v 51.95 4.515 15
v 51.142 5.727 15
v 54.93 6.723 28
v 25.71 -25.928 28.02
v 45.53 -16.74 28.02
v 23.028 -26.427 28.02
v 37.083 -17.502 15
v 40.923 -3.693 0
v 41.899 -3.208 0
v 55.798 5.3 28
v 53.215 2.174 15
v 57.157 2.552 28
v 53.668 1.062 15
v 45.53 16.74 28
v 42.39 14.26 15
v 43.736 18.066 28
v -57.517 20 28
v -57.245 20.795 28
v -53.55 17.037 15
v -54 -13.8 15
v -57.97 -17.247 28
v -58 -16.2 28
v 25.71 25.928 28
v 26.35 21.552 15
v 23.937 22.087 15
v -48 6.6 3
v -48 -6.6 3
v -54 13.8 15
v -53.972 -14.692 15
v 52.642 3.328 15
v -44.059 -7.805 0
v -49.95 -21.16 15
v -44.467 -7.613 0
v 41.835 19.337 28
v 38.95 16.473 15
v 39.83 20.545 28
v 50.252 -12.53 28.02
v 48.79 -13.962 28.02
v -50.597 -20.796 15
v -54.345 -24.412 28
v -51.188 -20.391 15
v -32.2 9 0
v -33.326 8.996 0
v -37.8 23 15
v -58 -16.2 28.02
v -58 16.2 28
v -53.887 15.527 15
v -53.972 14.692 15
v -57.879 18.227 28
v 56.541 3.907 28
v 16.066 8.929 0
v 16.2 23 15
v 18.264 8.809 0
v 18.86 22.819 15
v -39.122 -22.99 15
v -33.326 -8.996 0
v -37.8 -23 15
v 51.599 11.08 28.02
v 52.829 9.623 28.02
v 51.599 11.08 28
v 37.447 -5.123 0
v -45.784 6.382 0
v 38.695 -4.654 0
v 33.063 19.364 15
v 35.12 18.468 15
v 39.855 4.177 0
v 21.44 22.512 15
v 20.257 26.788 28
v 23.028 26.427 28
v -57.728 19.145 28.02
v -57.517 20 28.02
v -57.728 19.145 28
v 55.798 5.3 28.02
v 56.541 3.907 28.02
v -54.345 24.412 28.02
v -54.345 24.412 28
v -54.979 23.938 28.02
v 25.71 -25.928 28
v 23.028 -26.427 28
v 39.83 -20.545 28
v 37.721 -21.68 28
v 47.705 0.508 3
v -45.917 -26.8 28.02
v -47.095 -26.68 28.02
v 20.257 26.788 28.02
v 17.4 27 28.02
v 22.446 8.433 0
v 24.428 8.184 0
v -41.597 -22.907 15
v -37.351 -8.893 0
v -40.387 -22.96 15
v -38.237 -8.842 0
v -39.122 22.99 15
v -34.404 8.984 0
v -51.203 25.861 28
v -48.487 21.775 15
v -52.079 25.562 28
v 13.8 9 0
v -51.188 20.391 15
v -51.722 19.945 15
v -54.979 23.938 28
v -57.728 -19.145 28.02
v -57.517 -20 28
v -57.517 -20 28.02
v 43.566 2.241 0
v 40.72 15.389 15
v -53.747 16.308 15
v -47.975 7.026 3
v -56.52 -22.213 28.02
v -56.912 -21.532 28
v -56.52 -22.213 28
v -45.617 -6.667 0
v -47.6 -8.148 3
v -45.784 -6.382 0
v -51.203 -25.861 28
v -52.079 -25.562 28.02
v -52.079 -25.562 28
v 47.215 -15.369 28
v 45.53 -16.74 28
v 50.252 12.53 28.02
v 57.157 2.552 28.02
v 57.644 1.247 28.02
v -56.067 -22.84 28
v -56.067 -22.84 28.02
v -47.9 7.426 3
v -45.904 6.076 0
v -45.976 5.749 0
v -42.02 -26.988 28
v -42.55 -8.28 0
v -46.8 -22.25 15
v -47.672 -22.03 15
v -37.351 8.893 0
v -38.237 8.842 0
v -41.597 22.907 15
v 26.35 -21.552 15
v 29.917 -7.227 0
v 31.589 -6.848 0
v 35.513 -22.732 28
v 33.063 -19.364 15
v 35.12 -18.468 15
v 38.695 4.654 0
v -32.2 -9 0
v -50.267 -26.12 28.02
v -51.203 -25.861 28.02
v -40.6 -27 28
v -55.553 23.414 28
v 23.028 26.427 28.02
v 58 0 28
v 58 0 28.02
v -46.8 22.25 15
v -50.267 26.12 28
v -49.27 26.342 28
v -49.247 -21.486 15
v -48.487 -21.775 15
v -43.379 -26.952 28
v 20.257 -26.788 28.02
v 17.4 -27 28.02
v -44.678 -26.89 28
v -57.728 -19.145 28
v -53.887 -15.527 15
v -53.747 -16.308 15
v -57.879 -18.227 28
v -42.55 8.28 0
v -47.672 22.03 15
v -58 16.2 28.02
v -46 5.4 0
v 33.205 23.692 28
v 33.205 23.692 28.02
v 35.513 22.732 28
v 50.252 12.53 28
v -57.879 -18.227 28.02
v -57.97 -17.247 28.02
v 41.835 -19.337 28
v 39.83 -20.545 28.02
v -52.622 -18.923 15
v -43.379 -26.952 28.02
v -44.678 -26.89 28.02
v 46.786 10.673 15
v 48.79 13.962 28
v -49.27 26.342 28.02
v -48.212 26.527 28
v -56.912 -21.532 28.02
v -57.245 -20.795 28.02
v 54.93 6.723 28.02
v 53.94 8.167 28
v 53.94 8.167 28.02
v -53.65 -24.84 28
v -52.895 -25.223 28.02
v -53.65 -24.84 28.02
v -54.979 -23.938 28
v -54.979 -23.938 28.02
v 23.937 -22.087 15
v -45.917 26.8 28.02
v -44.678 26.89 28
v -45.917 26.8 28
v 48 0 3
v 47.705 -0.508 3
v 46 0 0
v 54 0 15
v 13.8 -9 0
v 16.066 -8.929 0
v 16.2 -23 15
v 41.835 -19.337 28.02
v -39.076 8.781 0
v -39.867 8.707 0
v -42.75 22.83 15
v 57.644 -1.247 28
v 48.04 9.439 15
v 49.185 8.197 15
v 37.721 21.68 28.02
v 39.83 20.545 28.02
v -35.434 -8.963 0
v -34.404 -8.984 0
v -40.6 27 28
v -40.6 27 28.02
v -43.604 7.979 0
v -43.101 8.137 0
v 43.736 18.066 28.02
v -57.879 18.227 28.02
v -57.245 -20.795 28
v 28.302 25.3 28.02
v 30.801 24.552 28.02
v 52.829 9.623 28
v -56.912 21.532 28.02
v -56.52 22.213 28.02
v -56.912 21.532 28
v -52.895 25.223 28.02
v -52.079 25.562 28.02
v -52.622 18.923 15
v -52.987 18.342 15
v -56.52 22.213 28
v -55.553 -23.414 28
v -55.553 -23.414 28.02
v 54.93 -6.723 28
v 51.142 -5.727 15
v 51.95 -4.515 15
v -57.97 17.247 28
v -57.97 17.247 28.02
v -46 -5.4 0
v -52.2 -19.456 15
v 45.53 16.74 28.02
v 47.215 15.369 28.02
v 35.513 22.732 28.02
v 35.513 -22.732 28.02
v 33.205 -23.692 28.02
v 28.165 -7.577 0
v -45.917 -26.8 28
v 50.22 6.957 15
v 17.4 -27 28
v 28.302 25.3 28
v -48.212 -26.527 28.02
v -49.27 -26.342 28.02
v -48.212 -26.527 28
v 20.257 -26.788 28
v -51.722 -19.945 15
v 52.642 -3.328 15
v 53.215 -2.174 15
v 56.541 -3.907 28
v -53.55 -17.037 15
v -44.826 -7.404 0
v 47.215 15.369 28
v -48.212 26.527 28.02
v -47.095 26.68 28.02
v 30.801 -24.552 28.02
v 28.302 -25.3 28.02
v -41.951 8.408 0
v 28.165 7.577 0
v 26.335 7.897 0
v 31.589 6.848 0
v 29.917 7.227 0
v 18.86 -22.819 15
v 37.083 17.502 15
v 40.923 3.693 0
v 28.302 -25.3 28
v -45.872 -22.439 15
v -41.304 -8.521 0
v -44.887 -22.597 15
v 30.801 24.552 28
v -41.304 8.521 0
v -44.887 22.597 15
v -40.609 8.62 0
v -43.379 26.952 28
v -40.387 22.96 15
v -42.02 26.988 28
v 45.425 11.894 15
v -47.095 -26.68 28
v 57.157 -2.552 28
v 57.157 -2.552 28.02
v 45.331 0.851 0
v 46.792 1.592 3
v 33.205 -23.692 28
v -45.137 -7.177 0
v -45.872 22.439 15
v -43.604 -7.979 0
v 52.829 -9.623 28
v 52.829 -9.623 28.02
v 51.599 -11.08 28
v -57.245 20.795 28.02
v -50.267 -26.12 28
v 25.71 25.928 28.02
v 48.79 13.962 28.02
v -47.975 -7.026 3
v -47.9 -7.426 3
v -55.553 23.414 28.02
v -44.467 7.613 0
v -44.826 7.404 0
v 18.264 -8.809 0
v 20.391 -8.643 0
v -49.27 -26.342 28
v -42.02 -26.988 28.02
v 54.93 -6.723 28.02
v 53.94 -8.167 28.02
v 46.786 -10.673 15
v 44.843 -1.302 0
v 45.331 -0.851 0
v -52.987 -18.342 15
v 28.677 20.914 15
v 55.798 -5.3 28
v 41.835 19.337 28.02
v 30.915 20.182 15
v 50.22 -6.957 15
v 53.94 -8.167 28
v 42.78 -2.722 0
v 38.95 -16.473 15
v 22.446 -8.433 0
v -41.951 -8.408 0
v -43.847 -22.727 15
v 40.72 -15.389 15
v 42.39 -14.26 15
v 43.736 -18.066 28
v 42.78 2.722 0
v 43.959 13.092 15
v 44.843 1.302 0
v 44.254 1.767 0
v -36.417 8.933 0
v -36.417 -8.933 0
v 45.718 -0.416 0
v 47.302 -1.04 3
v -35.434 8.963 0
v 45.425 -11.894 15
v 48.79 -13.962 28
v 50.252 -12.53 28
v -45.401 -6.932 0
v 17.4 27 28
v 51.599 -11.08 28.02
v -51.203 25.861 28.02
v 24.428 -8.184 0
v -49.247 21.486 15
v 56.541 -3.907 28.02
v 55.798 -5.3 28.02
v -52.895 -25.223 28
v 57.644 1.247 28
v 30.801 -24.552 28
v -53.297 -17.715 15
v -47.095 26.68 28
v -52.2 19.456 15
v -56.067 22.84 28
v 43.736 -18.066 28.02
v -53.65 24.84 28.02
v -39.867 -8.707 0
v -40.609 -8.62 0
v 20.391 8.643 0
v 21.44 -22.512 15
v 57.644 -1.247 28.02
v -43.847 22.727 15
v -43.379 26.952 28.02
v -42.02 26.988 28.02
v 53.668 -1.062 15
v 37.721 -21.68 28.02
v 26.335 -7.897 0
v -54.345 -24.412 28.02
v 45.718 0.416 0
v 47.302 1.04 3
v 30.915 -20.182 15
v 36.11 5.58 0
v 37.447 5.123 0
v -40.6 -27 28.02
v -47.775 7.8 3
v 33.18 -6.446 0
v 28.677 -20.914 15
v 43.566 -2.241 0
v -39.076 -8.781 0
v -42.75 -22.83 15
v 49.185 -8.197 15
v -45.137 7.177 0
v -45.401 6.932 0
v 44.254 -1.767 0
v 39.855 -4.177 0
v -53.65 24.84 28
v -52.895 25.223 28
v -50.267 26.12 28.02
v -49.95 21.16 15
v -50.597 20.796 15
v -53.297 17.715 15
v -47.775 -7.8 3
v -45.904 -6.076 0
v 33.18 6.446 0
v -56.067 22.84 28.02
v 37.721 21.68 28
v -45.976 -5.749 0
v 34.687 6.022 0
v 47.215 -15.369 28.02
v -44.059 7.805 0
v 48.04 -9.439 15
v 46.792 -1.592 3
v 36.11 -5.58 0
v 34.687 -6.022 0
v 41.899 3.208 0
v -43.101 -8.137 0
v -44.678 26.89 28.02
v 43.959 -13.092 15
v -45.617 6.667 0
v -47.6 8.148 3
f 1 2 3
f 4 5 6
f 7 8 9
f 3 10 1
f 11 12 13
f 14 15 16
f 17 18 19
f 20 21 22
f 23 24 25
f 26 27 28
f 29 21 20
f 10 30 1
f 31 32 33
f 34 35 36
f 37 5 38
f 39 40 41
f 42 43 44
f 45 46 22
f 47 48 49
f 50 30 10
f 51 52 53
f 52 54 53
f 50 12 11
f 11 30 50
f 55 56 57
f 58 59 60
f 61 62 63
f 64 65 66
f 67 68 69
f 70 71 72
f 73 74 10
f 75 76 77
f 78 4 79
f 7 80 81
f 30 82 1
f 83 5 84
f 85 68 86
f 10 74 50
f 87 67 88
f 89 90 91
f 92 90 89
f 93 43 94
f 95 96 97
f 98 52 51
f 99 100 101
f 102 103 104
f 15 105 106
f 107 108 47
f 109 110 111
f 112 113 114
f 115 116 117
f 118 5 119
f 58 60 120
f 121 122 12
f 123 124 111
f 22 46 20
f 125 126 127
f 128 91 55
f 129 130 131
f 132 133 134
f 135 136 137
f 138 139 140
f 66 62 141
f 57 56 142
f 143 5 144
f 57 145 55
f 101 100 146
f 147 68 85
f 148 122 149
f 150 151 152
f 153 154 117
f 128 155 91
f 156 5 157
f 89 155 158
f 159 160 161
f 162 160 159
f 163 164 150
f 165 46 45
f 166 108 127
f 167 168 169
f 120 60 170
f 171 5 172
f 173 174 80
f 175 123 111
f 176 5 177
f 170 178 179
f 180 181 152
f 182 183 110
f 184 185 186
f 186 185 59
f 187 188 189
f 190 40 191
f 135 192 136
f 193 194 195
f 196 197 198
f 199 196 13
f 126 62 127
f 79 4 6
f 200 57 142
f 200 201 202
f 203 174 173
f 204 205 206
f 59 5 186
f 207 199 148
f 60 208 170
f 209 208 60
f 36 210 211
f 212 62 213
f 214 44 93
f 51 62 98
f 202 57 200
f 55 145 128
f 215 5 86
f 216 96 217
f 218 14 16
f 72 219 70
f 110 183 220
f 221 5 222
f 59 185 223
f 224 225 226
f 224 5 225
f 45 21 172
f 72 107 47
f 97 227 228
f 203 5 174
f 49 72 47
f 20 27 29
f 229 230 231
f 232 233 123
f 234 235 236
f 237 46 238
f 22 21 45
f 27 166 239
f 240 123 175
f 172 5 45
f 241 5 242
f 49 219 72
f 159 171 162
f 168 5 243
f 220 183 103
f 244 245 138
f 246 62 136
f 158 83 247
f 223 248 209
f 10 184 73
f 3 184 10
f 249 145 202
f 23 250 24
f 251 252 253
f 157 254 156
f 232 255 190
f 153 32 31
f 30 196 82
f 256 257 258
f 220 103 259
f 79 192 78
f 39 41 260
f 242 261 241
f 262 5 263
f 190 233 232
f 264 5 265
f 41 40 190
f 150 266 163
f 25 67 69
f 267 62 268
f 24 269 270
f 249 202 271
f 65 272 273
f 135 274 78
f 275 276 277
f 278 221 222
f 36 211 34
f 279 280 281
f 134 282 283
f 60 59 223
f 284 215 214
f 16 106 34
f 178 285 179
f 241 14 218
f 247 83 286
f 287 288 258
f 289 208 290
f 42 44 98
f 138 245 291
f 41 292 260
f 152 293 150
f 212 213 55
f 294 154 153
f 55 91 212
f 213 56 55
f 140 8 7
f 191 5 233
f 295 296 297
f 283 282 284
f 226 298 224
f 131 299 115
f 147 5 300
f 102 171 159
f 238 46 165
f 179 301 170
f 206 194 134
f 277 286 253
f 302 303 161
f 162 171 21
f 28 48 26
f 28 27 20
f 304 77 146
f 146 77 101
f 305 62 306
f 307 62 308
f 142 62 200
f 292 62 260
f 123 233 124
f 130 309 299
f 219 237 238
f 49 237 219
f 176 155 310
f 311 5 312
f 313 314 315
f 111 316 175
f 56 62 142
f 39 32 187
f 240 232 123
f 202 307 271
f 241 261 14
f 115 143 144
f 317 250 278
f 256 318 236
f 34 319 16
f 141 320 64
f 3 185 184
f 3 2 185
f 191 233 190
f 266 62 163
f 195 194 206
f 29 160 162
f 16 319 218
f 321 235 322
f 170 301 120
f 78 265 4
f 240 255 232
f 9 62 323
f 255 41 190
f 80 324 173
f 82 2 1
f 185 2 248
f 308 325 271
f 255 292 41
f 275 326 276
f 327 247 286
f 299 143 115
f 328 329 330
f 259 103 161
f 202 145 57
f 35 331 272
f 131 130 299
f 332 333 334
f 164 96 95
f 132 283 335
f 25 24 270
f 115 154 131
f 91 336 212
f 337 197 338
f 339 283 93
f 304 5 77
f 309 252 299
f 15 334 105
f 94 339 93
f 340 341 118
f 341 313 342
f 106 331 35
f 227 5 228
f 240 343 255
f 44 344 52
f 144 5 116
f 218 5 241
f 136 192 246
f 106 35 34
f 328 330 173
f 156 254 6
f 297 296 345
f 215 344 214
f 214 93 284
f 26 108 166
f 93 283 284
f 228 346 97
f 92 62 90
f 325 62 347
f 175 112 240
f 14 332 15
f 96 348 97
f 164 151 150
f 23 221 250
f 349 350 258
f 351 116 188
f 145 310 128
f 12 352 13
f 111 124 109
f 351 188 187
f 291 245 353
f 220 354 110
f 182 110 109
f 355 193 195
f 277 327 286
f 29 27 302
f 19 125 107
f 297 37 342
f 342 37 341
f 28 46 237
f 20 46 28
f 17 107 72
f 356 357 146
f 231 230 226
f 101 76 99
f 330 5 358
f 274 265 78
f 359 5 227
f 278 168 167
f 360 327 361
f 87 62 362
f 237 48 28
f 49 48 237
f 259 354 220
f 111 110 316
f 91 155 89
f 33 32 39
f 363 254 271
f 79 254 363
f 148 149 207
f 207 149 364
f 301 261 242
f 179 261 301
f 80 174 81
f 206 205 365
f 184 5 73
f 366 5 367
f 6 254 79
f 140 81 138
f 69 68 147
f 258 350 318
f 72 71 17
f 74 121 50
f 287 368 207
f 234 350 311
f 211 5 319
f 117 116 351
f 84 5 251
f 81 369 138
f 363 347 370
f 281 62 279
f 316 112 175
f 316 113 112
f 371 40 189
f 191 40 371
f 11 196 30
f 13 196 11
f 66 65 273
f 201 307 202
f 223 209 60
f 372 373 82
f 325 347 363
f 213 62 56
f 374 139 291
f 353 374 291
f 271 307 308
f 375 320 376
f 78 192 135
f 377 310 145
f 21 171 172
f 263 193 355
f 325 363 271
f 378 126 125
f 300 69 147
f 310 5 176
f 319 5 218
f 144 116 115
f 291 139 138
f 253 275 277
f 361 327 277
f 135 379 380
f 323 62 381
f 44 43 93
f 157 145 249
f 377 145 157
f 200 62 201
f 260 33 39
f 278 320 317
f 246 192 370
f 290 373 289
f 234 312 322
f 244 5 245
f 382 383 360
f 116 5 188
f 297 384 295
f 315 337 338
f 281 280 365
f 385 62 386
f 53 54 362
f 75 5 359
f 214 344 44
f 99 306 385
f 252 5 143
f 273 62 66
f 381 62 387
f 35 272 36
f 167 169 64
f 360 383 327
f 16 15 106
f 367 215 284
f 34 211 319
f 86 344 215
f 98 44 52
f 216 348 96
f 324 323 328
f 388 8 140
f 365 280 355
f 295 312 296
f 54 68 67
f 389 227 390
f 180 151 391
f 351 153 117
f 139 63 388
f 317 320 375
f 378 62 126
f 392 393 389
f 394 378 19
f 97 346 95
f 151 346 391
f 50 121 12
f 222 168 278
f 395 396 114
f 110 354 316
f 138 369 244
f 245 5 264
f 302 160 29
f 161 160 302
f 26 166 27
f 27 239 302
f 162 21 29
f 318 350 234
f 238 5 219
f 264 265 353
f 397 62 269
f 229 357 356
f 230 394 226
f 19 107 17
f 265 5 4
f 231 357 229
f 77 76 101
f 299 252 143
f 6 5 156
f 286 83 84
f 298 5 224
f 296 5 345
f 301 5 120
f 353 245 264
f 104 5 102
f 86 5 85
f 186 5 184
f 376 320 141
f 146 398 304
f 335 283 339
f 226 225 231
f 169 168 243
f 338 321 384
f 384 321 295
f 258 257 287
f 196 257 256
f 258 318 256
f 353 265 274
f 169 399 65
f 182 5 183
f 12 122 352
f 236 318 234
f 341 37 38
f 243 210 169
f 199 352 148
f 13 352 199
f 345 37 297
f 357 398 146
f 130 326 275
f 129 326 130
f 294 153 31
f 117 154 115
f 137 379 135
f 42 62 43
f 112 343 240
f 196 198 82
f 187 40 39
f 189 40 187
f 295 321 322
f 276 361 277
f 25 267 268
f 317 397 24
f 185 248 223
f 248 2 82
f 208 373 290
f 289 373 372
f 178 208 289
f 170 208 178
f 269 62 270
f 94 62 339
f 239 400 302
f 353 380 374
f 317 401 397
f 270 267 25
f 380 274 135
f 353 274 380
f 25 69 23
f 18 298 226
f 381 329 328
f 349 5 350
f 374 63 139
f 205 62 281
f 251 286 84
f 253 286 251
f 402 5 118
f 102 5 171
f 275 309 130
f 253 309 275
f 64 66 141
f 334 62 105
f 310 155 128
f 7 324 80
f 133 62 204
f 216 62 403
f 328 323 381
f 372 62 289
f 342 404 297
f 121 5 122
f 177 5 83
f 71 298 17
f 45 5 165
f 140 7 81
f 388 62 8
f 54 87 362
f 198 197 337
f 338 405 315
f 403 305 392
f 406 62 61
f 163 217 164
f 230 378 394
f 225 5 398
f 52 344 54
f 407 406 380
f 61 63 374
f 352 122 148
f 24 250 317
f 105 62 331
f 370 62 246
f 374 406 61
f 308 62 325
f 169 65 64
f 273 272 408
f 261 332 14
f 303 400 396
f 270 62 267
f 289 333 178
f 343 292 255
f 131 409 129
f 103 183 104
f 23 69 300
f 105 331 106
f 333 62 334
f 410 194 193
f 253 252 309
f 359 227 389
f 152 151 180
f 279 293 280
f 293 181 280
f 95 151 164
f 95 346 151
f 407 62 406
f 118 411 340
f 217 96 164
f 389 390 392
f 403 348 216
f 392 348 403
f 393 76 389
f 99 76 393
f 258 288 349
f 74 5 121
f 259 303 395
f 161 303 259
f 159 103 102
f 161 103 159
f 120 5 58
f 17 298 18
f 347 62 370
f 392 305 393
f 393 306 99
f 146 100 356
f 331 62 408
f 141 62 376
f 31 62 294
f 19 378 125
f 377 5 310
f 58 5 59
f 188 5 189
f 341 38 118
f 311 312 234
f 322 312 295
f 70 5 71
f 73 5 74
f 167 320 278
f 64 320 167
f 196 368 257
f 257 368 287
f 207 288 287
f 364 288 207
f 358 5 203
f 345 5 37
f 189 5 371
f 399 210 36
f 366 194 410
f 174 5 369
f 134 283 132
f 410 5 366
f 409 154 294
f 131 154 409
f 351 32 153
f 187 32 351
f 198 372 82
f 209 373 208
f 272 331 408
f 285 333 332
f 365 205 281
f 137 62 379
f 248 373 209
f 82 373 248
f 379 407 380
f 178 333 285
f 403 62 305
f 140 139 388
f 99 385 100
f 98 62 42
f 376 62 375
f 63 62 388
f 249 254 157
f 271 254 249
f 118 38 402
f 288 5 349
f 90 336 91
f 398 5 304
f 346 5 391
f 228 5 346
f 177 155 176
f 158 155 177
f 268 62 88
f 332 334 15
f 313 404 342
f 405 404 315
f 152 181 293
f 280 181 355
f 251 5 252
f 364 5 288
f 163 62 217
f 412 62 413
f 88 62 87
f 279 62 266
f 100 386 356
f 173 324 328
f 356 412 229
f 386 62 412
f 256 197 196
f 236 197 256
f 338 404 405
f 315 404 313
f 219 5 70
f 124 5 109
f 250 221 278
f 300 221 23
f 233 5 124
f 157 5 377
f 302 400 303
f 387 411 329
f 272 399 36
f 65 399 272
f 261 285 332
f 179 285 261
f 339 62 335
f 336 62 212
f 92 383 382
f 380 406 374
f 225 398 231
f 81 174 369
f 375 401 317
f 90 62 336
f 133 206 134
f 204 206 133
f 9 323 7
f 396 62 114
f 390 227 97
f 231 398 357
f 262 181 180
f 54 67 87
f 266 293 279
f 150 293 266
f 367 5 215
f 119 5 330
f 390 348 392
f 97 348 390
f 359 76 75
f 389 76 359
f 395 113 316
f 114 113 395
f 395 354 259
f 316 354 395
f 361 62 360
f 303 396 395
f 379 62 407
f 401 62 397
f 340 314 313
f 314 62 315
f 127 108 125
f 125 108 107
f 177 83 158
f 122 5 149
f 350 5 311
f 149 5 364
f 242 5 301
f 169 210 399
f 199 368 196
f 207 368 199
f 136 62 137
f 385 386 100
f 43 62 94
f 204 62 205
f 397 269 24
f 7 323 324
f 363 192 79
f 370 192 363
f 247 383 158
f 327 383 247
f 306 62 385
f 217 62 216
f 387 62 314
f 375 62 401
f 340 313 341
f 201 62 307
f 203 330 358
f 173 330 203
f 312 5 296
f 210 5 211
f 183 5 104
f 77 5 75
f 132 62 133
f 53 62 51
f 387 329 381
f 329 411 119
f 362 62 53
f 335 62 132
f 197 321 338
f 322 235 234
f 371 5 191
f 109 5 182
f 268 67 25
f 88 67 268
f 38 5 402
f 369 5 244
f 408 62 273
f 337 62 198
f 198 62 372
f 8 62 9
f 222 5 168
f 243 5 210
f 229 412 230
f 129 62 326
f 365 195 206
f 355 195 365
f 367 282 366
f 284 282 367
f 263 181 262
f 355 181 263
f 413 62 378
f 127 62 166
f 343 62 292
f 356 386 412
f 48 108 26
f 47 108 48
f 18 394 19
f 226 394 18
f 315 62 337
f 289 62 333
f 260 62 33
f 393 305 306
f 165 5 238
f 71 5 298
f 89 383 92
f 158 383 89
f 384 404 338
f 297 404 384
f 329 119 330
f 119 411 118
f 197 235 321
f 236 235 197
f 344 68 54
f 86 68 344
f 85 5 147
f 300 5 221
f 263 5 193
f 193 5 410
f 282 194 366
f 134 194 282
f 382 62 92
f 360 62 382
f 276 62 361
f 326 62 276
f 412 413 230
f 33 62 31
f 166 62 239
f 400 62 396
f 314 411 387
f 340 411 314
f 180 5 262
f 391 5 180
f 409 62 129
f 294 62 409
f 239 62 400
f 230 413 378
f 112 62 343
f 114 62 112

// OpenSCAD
hull() {
  hull() {
    hull() {
      translate([0, 0, 0]) {
        linear_extrude(height = 2.0e-2) {
          polygon(points = [[-46, -5.4], [-45.976041667, -5.748854167], [-45.904166667, -6.075833333], [-45.784375, -6.3815625], [-45.616666667, -6.666666667], [-45.401041667, -6.931770833], [-45.1375, -7.1775], [-44.826041667, -7.404479167], [-44.466666667, -7.613333333], [-44.059375, -7.8046875], [-43.604166667, -7.979166667], [-43.101041667, -8.137395833], [-42.55, -8.28], [-41.951041667, -8.407604167], [-41.304166667, -8.520833333], [-40.609375, -8.6203125], [-39.866666667, -8.706666667], [-39.076041667, -8.780520833], [-38.2375, -8.8425], [-37.351041667, -8.893229167], [-36.416666667, -8.933333333], [-35.434375, -8.9634375], [-34.404166667, -8.984166667], [-33.326041667, -8.996145833], [-32.2, -9], [-30.451707176, -9], [-28.659490741, -9], [-26.82734375, -9], [-24.959259259, -9], [-23.059230324, -9], [-21.13125, -9], [-19.179311343, -9], [-17.207407407, -9], [-15.21953125, -9], [-13.219675926, -9], [-11.211834491, -9], [-9.2, -9], [-7.188165509, -9], [-5.180324074, -9], [-3.18046875, -9], [-1.192592593, -9], [0.779311343, -9], [2.73125, -9], [4.659230324, -9], [6.559259259, -9], [8.42734375, -9], [10.259490741, -9], [12.051707176, -9], [13.8, -9], [16.06619213, -8.929270833], [18.263703704, -8.809166667], [20.3909375, -8.6428125], [22.446296296, -8.433333333], [24.42818287, -8.183854167], [26.335, -7.8975], [28.165150463, -7.577395833], [29.917037037, -7.226666667], [31.5890625, -6.8484375], [33.17962963, -6.445833333], [34.687141204, -6.021979167], [36.11, -5.58], [37.446608796, -5.123020833], [38.69537037, -4.654166667], [39.8546875, -4.1765625], [40.922962963, -3.693333333], [41.898599537, -3.207604167], [42.78, -2.7225], [43.56556713, -2.241145833], [44.253703704, -1.766666667], [44.8428125, -1.3021875], [45.331296296, -0.850833333], [45.71755787, -0.415729167], [46, 0], [45.71755787, 0.415729167], [45.331296296, 0.850833333], [44.8428125, 1.3021875], [44.253703704, 1.766666667], [43.56556713, 2.241145833], [42.78, 2.7225], [41.898599537, 3.207604167], [40.922962963, 3.693333333], [39.8546875, 4.1765625], [38.69537037, 4.654166667], [37.446608796, 5.123020833], [36.11, 5.58], [34.687141204, 6.021979167], [33.17962963, 6.445833333], [31.5890625, 6.8484375], [29.917037037, 7.226666667], [28.165150463, 7.577395833], [26.335, 7.8975], [24.42818287, 8.183854167], [22.446296296, 8.433333333], [20.3909375, 8.6428125], [18.263703704, 8.809166667], [16.06619213, 8.929270833], [13.8, 9], [12.051707176, 9], [10.259490741, 9], [8.42734375, 9], [6.559259259, 9], [4.659230324, 9], [2.73125, 9], [0.779311343, 9], [-1.192592593, 9], [-3.18046875, 9], [-5.180324074, 9], [-7.188165509, 9], [-9.2, 9], [-11.211834491, 9], [-13.219675926, 9], [-15.21953125, 9], [-17.207407407, 9], [-19.179311343, 9], [-21.13125, 9], [-23.059230324, 9], [-24.959259259, 9], [-26.82734375, 9], [-28.659490741, 9], [-30.451707176, 9], [-32.2, 9], [-33.326041667, 8.996145833], [-34.404166667, 8.984166667], [-35.434375, 8.9634375], [-36.416666667, 8.933333333], [-37.351041667, 8.893229167], [-38.2375, 8.8425], [-39.076041667, 8.780520833], [-39.866666667, 8.706666667], [-40.609375, 8.6203125], [-41.304166667, 8.520833333], [-41.951041667, 8.407604167], [-42.55, 8.28], [-43.101041667, 8.137395833], [-43.604166667, 7.979166667], [-44.059375, 7.8046875], [-44.466666667, 7.613333333], [-44.826041667, 7.404479167], [-45.1375, 7.1775], [-45.401041667, 6.931770833], [-45.616666667, 6.666666667], [-45.784375, 6.3815625], [-45.904166667, 6.075833333], [-45.976041667, 5.748854167], [-46, 5.4], [-46, 4.95], [-46, 4.5], [-46, 4.05], [-46, 3.6], [-46, 3.15], [-46, 2.7], [-46, 2.25], [-46, 1.8], [-46, 1.35], [-46, 0.9], [-46, 0.45], [-46, 0], [-46, -0.45], [-46, -0.9], [-46, -1.35], [-46, -1.8], [-46, -2.25], [-46, -2.7], [-46, -3.15], [-46, -3.6], [-46, -4.05], [-46, -4.5], [-46, -4.95], [-46, -5.4]]);
        }
      }
      translate([0, 0, 3]) {
        linear_extrude(height = 2.0e-2) {
          polygon(points = [[-48, -6.6], [-47.975, -7.026377315], [-47.9, -7.426018519], [-47.775, -7.7996875], [-47.6, -8.148148148], [-47.375, -8.472164352], [-47.1, -8.7725], [-46.775, -9.049918981], [-46.4, -9.305185185], [-45.975, -9.5390625], [-45.5, -9.752314815], [-44.975, -9.945706019], [-44.4, -10.12], [-43.775, -10.275960648], [-43.1, -10.414351852], [-42.375, -10.5359375], [-41.6, -10.641481481], [-40.775, -10.731747685], [-39.9, -10.8075], [-38.975, -10.869502315], [-38, -10.918518519], [-36.975, -10.9553125], [-35.9, -10.980648148], [-34.775, -10.995289352], [-33.6, -11], [-31.775694444, -11], [-29.905555556, -11], [-27.99375, -11], [-26.044444444, -11], [-24.061805556, -11], [-22.05, -11], [-20.013194444, -11], [-17.955555556, -11], [-15.88125, -11], [-13.794444444, -11], [-11.699305556, -11], [-9.6, -11], [-7.500694444, -11], [-5.405555556, -11], [-3.31875, -11], [-1.244444444, -11], [0.813194444, -11], [2.85, -11], [4.861805556, -11], [6.844444444, -11], [8.79375, -11], [10.705555556, -11], [12.575694444, -11], [14.4, -11], [16.764722222, -10.913553241], [19.057777778, -10.766759259], [21.2775, -10.5634375], [23.422222222, -10.307407407], [25.490277778, -10.002488426], [27.48, -9.6525], [29.389722222, -9.261261574], [31.217777778, -8.832592593], [32.9625, -8.3703125], [34.622222222, -7.878240741], [36.195277778, -7.360196759], [37.68, -6.82], [39.074722222, -6.261469907], [40.377777778, -5.688425926], [41.5875, -5.1046875], [42.702222222, -4.514074074], [43.720277778, -3.920405093], [44.64, -3.3275], [45.459722222, -2.739178241], [46.177777778, -2.159259259], [46.7925, -1.5915625], [47.302222222, -1.039907407], [47.705277778, -0.508113426], [48, 0], [47.705277778, 0.508113426], [47.302222222, 1.039907407], [46.7925, 1.5915625], [46.177777778, 2.159259259], [45.459722222, 2.739178241], [44.64, 3.3275], [43.720277778, 3.920405093], [42.702222222, 4.514074074], [41.5875, 5.1046875], [40.377777778, 5.688425926], [39.074722222, 6.261469907], [37.68, 6.82], [36.195277778, 7.360196759], [34.622222222, 7.878240741], [32.9625, 8.3703125], [31.217777778, 8.832592593], [29.389722222, 9.261261574], [27.48, 9.6525], [25.490277778, 10.002488426], [23.422222222, 10.307407407], [21.2775, 10.5634375], [19.057777778, 10.766759259], [16.764722222, 10.913553241], [14.4, 11], [12.575694444, 11], [10.705555556, 11], [8.79375, 11], [6.844444444, 11], [4.861805556, 11], [2.85, 11], [0.813194444, 11], [-1.244444444, 11], [-3.31875, 11], [-5.405555556, 11], [-7.500694444, 11], [-9.6, 11], [-11.699305556, 11], [-13.794444444, 11], [-15.88125, 11], [-17.955555556, 11], [-20.013194444, 11], [-22.05, 11], [-24.061805556, 11], [-26.044444444, 11], [-27.99375, 11], [-29.905555556, 11], [-31.775694444, 11], [-33.6, 11], [-34.775, 10.995289352], [-35.9, 10.980648148], [-36.975, 10.9553125], [-38, 10.918518519], [-38.975, 10.869502315], [-39.9, 10.8075], [-40.775, 10.731747685], [-41.6, 10.641481481], [-42.375, 10.5359375], [-43.1, 10.414351852], [-43.775, 10.275960648], [-44.4, 10.12], [-44.975, 9.945706019], [-45.5, 9.752314815], [-45.975, 9.5390625], [-46.4, 9.305185185], [-46.775, 9.049918981], [-47.1, 8.7725], [-47.375, 8.472164352], [-47.6, 8.148148148], [-47.775, 7.7996875], [-47.9, 7.426018519], [-47.975, 7.026377315], [-48, 6.6], [-48, 6.05], [-48, 5.5], [-48, 4.95], [-48, 4.4], [-48, 3.85], [-48, 3.3], [-48, 2.75], [-48, 2.2], [-48, 1.65], [-48, 1.1], [-48, 0.55], [-48, 0], [-48, -0.55], [-48, -1.1], [-48, -1.65], [-48, -2.2], [-48, -2.75], [-48, -3.3], [-48, -3.85], [-48, -4.4], [-48, -4.95], [-48, -5.5], [-48, -6.05], [-48, -6.6]]);
        }
      }
    }
    translate([0, 0, 15]) {
      linear_extrude(height = 2.0e-2) {
        polygon(points = [[-54, -13.8], [-53.971875, -14.691516204], [-53.8875, -15.52712963], [-53.746875, -16.3084375], [-53.55, -17.037037037], [-53.296875, -17.714525463], [-52.9875, -18.3425], [-52.621875, -18.92255787], [-52.2, -19.456296296], [-51.721875, -19.9453125], [-51.1875, -20.391203704], [-50.596875, -20.79556713], [-49.95, -21.16], [-49.246875, -21.486099537], [-48.4875, -21.775462963], [-47.671875, -22.0296875], [-46.8, -22.25037037], [-45.871875, -22.439108796], [-44.8875, -22.5975], [-43.846875, -22.727141204], [-42.75, -22.82962963], [-41.596875, -22.9065625], [-40.3875, -22.959537037], [-39.121875, -22.990150463], [-37.8, -23], [-35.74765625, -23], [-33.64375, -23], [-31.49296875, -23], [-29.3, -23], [-27.06953125, -23], [-24.80625, -23], [-22.51484375, -23], [-20.2, -23], [-17.86640625, -23], [-15.51875, -23], [-13.16171875, -23], [-10.8, -23], [-8.43828125, -23], [-6.08125, -23], [-3.73359375, -23], [-1.4, -23], [0.91484375, -23], [3.20625, -23], [5.46953125, -23], [7.7, -23], [9.89296875, -23], [12.04375, -23], [14.14765625, -23], [16.2, -23], [18.8603125, -22.819247685], [21.44, -22.512314815], [23.9371875, -22.0871875], [26.35, -21.551851852], [28.6765625, -20.914293981], [30.915, -20.1825], [33.0634375, -19.364456019], [35.12, -18.468148148], [37.0828125, -17.5015625], [38.95, -16.472685185], [40.7196875, -15.389502315], [42.39, -14.26], [43.9590625, -13.092164352], [45.425, -11.893981481], [46.7859375, -10.6734375], [48.04, -9.438518519], [49.1853125, -8.197210648], [50.22, -6.9575], [51.1421875, -5.727372685], [51.95, -4.514814815], [52.6415625, -3.3278125], [53.215, -2.174351852], [53.6684375, -1.062418981], [54, 0], [53.6684375, 1.062418981], [53.215, 2.174351852], [52.6415625, 3.3278125], [51.95, 4.514814815], [51.1421875, 5.727372685], [50.22, 6.9575], [49.1853125, 8.197210648], [48.04, 9.438518519], [46.7859375, 10.6734375], [45.425, 11.893981481], [43.9590625, 13.092164352], [42.39, 14.26], [40.7196875, 15.389502315], [38.95, 16.472685185], [37.0828125, 17.5015625], [35.12, 18.468148148], [33.0634375, 19.364456019], [30.915, 20.1825], [28.6765625, 20.914293981], [26.35, 21.551851852], [23.9371875, 22.0871875], [21.44, 22.512314815], [18.8603125, 22.819247685], [16.2, 23], [14.14765625, 23], [12.04375, 23], [9.89296875, 23], [7.7, 23], [5.46953125, 23], [3.20625, 23], [0.91484375, 23], [-1.4, 23], [-3.73359375, 23], [-6.08125, 23], [-8.43828125, 23], [-10.8, 23], [-13.16171875, 23], [-15.51875, 23], [-17.86640625, 23], [-20.2, 23], [-22.51484375, 23], [-24.80625, 23], [-27.06953125, 23], [-29.3, 23], [-31.49296875, 23], [-33.64375, 23], [-35.74765625, 23], [-37.8, 23], [-39.121875, 22.990150463], [-40.3875, 22.959537037], [-41.596875, 22.9065625], [-42.75, 22.82962963], [-43.846875, 22.727141204], [-44.8875, 22.5975], [-45.871875, 22.439108796], [-46.8, 22.25037037], [-47.671875, 22.0296875], [-48.4875, 21.775462963], [-49.246875, 21.486099537], [-49.95, 21.16], [-50.596875, 20.79556713], [-51.1875, 20.391203704], [-51.721875, 19.9453125], [-52.2, 19.456296296], [-52.621875, 18.92255787], [-52.9875, 18.3425], [-53.296875, 17.714525463], [-53.55, 17.037037037], [-53.746875, 16.3084375], [-53.8875, 15.52712963], [-53.971875, 14.691516204], [-54, 13.8], [-54, 12.65], [-54, 11.5], [-54, 10.35], [-54, 9.2], [-54, 8.05], [-54, 6.9], [-54, 5.75], [-54, 4.6], [-54, 3.45], [-54, 2.3], [-54, 1.15], [-54, 0], [-54, -1.15], [-54, -2.3], [-54, -3.45], [-54, -4.6], [-54, -5.75], [-54, -6.9], [-54, -8.05], [-54, -9.2], [-54, -10.35], [-54, -11.5], [-54, -12.65], [-54, -13.8]]);
      }
    }
  }
  translate([0, 0, 28]) {
    linear_extrude(height = 2.0e-2) {
      polygon(points = [[-58, -16.2], [-57.969791667, -17.2465625], [-57.879166667, -18.2275], [-57.728125, -19.1446875], [-57.516666667, -20], [-57.244791667, -20.7953125], [-56.9125, -21.5325], [-56.519791667, -22.2134375], [-56.066666667, -22.84], [-55.553125, -23.4140625], [-54.979166667, -23.9375], [-54.344791667, -24.4121875], [-53.65, -24.84], [-52.894791667, -25.2228125], [-52.079166667, -25.5625], [-51.203125, -25.8609375], [-50.266666667, -26.12], [-49.269791667, -26.3415625], [-48.2125, -26.5275], [-47.094791667, -26.6796875], [-45.916666667, -26.8], [-44.678125, -26.8903125], [-43.379166667, -26.9525], [-42.019791667, -26.9884375], [-40.6, -27], [-38.395630787, -27], [-36.13587963, -27], [-33.82578125, -27], [-31.47037037, -27], [-29.074681713, -27], [-26.64375, -27], [-24.182609954, -27], [-21.696296296, -27], [-19.18984375, -27], [-16.668287037, -27], [-14.13666088, -27], [-11.6, -27], [-9.06333912, -27], [-6.531712963, -27], [-4.01015625, -27], [-1.503703704, -27], [0.982609954, -27], [3.44375, -27], [5.874681713, -27], [8.27037037, -27], [10.62578125, -27], [12.93587963, -27], [15.195630787, -27], [17.4, -27], [20.257372685, -26.7878125], [23.028148148, -26.4275], [25.7103125, -25.9284375], [28.301851852, -25.3], [30.800752315, -24.5515625], [33.205, -23.6925], [35.512581019, -22.7321875], [37.721481481, -21.68], [39.8296875, -20.5453125], [41.835185185, -19.3375], [43.735960648, -18.0659375], [45.53, -16.74], [47.215289352, -15.3690625], [48.789814815, -13.9625], [50.2515625, -12.5296875], [51.598518519, -11.08], [52.828668981, -9.6228125], [53.94, -8.1675], [54.930497685, -6.7234375], [55.798148148, -5.3], [56.5409375, -3.9065625], [57.156851852, -2.5525], [57.643877315, -1.2471875], [58, 0], [57.643877315, 1.2471875], [57.156851852, 2.5525], [56.5409375, 3.9065625], [55.798148148, 5.3], [54.930497685, 6.7234375], [53.94, 8.1675], [52.828668981, 9.6228125], [51.598518519, 11.08], [50.2515625, 12.5296875], [48.789814815, 13.9625], [47.215289352, 15.3690625], [45.53, 16.74], [43.735960648, 18.0659375], [41.835185185, 19.3375], [39.8296875, 20.5453125], [37.721481481, 21.68], [35.512581019, 22.7321875], [33.205, 23.6925], [30.800752315, 24.5515625], [28.301851852, 25.3], [25.7103125, 25.9284375], [23.028148148, 26.4275], [20.257372685, 26.7878125], [17.4, 27], [15.195630787, 27], [12.93587963, 27], [10.62578125, 27], [8.27037037, 27], [5.874681713, 27], [3.44375, 27], [0.982609954, 27], [-1.503703704, 27], [-4.01015625, 27], [-6.531712963, 27], [-9.06333912, 27], [-11.6, 27], [-14.13666088, 27], [-16.668287037, 27], [-19.18984375, 27], [-21.696296296, 27], [-24.182609954, 27], [-26.64375, 27], [-29.074681713, 27], [-31.47037037, 27], [-33.82578125, 27], [-36.13587963, 27], [-38.395630787, 27], [-40.6, 27], [-42.019791667, 26.9884375], [-43.379166667, 26.9525], [-44.678125, 26.8903125], [-45.916666667, 26.8], [-47.094791667, 26.6796875], [-48.2125, 26.5275], [-49.269791667, 26.3415625], [-50.266666667, 26.12], [-51.203125, 25.8609375], [-52.079166667, 25.5625], [-52.894791667, 25.2228125], [-53.65, 24.84], [-54.344791667, 24.4121875], [-54.979166667, 23.9375], [-55.553125, 23.4140625], [-56.066666667, 22.84], [-56.519791667, 22.2134375], [-56.9125, 21.5325], [-57.244791667, 20.7953125], [-57.516666667, 20], [-57.728125, 19.1446875], [-57.879166667, 18.2275], [-57.969791667, 17.2465625], [-58, 16.2], [-58, 14.85], [-58, 13.5], [-58, 12.15], [-58, 10.8], [-58, 9.45], [-58, 8.1], [-58, 6.75], [-58, 5.4], [-58, 4.05], [-58, 2.7], [-58, 1.35], [-58, 0], [-58, -1.35], [-58, -2.7], [-58, -4.05], [-58, -5.4], [-58, -6.75], [-58, -8.1], [-58, -9.45], [-58, -10.8], [-58, -12.15], [-58, -13.5], [-58, -14.85], [-58, -16.2]]);
    }
  }
}
$fn = 50;
